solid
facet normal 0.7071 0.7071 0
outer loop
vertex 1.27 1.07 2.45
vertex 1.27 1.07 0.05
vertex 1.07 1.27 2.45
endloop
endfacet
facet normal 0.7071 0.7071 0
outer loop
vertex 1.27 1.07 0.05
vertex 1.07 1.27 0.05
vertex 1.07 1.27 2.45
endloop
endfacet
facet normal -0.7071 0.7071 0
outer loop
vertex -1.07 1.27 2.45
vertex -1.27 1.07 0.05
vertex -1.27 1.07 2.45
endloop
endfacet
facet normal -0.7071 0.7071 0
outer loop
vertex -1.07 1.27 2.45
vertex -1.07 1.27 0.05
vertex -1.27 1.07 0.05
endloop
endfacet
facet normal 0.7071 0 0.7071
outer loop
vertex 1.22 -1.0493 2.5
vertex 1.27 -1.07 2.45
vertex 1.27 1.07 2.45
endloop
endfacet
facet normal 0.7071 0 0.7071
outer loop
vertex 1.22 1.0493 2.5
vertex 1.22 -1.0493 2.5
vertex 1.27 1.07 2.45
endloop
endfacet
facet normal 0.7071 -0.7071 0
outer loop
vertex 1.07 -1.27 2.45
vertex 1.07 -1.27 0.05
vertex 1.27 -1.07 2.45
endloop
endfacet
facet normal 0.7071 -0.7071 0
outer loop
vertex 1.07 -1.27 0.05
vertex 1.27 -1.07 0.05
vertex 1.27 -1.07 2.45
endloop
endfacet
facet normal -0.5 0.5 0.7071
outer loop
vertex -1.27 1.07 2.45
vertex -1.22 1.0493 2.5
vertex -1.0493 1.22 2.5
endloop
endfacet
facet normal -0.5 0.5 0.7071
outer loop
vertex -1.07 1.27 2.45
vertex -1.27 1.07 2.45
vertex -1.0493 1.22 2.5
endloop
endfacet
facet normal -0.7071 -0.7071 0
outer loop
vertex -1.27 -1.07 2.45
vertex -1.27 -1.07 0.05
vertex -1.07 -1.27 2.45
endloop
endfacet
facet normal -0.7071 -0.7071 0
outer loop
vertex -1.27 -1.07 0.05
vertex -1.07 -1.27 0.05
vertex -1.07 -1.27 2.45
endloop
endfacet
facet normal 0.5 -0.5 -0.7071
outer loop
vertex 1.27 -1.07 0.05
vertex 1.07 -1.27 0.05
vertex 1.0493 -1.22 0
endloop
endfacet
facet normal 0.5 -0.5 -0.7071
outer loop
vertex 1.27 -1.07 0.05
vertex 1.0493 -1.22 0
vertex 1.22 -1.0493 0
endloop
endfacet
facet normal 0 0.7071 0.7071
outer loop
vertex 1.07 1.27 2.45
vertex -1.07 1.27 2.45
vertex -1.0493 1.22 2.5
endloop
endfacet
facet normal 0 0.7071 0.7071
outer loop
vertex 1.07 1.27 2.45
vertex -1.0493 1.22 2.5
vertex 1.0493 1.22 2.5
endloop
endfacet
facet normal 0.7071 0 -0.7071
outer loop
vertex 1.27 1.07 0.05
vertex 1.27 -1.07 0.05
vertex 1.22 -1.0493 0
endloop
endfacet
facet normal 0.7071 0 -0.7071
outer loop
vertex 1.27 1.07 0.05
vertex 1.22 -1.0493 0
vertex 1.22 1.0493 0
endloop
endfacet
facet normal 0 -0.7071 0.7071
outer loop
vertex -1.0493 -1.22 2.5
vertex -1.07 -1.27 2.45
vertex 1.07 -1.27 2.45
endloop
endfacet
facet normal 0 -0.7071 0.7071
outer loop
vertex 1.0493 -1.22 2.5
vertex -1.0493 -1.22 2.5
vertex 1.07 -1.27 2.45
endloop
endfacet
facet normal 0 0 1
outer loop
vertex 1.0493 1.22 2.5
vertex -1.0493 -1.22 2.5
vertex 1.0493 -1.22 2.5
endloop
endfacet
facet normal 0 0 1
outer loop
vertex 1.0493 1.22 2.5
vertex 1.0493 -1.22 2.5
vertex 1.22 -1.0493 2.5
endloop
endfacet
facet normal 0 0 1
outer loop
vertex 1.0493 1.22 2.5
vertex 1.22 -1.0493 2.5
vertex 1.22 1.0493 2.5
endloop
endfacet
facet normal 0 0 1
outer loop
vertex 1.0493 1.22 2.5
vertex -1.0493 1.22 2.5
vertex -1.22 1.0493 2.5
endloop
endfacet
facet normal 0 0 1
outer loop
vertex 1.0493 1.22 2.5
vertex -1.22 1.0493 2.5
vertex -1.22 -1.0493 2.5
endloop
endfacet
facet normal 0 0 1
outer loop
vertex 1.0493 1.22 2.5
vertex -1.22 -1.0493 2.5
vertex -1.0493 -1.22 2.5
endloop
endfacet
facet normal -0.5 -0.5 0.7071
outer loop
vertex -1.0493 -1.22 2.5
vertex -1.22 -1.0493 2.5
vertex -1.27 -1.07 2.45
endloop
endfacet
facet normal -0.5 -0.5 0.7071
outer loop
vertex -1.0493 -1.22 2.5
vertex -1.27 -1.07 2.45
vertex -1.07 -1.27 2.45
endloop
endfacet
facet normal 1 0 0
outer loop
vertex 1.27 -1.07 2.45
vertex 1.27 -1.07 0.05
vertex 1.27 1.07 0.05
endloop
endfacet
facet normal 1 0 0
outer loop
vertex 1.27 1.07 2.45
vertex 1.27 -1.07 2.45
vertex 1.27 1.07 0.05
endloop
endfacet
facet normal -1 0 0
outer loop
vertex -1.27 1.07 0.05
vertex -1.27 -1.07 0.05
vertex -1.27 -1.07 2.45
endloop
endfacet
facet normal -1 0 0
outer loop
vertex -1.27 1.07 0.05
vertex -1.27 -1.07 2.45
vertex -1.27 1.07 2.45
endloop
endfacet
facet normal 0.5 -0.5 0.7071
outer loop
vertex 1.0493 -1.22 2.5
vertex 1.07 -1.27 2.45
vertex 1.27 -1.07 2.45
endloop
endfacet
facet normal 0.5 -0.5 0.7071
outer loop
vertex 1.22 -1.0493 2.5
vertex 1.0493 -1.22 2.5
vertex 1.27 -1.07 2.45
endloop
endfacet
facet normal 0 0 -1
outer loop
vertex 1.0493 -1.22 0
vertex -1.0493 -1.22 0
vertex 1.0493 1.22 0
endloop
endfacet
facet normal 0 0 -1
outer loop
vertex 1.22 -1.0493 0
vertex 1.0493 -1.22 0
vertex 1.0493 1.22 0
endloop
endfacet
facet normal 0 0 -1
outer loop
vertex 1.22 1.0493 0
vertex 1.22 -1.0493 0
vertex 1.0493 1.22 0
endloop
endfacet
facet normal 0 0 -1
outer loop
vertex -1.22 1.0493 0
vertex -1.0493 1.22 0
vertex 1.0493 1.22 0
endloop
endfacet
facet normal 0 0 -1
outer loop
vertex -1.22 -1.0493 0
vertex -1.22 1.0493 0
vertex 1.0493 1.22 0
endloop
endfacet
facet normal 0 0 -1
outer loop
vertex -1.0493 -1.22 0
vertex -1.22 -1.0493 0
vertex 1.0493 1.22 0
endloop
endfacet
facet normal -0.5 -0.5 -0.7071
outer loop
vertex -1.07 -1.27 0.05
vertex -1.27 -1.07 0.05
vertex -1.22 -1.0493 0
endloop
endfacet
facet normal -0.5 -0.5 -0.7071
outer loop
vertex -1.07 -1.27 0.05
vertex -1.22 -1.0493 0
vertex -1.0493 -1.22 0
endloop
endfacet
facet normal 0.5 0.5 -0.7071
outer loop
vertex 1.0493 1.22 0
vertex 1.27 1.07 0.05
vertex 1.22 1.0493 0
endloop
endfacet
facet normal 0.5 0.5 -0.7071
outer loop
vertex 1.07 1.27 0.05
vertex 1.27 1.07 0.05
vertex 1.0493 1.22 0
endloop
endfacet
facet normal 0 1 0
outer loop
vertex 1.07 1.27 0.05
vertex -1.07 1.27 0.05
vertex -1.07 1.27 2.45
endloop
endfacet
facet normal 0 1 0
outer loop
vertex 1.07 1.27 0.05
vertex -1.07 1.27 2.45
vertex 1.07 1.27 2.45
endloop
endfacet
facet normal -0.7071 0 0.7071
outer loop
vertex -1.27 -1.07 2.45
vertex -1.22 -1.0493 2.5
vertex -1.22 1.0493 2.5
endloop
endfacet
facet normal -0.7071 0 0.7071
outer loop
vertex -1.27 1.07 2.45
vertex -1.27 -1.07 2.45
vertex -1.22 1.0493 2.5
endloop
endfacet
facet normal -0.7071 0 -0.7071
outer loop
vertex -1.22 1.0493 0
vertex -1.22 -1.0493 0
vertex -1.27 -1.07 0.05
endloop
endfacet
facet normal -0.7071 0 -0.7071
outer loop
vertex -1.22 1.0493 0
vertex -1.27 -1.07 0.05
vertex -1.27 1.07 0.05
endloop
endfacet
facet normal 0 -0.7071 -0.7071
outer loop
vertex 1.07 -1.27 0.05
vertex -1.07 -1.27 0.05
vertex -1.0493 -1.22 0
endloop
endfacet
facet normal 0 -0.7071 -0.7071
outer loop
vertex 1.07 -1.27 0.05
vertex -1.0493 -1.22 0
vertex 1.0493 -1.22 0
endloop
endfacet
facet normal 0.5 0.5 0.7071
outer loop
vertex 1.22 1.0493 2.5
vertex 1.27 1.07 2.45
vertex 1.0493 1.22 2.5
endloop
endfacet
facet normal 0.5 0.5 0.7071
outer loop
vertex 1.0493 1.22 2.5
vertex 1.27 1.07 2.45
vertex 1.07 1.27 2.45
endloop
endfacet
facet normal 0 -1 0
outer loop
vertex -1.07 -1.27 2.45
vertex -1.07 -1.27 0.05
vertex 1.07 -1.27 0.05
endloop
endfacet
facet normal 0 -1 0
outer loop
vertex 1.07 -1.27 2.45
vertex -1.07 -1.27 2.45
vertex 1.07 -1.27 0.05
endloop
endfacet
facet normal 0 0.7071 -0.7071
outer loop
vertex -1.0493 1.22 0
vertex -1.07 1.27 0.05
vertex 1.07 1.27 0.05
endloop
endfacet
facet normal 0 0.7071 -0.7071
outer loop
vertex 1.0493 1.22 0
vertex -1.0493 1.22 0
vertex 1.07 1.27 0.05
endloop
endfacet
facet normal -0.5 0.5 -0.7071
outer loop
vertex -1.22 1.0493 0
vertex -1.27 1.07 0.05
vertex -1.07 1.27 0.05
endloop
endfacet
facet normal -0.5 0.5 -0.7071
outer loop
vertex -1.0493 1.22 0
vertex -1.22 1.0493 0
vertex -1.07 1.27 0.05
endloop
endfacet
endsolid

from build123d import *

# Parameters (mm, degrees)
SKETCH212_W     = 2.54
SKETCH212_H     = 2.54
PAD083_DEPTH    = 2.5
CHAMFER020_SIZE = 0.2
CHAMFER019_SIZE = 0.05


with BuildPart() as part:
    # Sketch212 → Pad083 (new body)
    with BuildSketch(Plane.XY):
        Rectangle(SKETCH212_W, SKETCH212_H)
    extrude(amount=PAD083_DEPTH)

    # Chamfer020
    chamfer020_edges = [part.edges().sort_by_distance(p)[0] for p in [
        (1.27, -1.27, 1.25),
        (-1.27, -1.27, 1.25),
        (1.27, 1.27, 1.25),
        (-1.27, 1.27, 1.25),
    ]]
    chamfer(chamfer020_edges, length=CHAMFER020_SIZE)

    # Chamfer019
    chamfer019_edges = [part.edges().sort_by_distance(p)[0] for p in [
        (0, -1.27, 2.5),
        (-1.17, -1.17, 2.5),
        (1.17, -1.17, 2.5),
        (-1.27, 0, 2.5),
        (1.27, 0, 2.5),
        (-1.17, 1.17, 2.5),
        (1.17, 1.17, 2.5),
        (0, 1.27, 2.5),
        (0, -1.27, 0),
        (-1.17, -1.17, 0),
        (1.17, -1.17, 0),
        (-1.27, 0, 0),
        (1.27, 0, 0),
        (-1.17, 1.17, 0),
        (1.17, 1.17, 0),
        (0, 1.27, 0),
    ]]
    chamfer(chamfer019_edges, length=CHAMFER019_SIZE)


solid = part.part
